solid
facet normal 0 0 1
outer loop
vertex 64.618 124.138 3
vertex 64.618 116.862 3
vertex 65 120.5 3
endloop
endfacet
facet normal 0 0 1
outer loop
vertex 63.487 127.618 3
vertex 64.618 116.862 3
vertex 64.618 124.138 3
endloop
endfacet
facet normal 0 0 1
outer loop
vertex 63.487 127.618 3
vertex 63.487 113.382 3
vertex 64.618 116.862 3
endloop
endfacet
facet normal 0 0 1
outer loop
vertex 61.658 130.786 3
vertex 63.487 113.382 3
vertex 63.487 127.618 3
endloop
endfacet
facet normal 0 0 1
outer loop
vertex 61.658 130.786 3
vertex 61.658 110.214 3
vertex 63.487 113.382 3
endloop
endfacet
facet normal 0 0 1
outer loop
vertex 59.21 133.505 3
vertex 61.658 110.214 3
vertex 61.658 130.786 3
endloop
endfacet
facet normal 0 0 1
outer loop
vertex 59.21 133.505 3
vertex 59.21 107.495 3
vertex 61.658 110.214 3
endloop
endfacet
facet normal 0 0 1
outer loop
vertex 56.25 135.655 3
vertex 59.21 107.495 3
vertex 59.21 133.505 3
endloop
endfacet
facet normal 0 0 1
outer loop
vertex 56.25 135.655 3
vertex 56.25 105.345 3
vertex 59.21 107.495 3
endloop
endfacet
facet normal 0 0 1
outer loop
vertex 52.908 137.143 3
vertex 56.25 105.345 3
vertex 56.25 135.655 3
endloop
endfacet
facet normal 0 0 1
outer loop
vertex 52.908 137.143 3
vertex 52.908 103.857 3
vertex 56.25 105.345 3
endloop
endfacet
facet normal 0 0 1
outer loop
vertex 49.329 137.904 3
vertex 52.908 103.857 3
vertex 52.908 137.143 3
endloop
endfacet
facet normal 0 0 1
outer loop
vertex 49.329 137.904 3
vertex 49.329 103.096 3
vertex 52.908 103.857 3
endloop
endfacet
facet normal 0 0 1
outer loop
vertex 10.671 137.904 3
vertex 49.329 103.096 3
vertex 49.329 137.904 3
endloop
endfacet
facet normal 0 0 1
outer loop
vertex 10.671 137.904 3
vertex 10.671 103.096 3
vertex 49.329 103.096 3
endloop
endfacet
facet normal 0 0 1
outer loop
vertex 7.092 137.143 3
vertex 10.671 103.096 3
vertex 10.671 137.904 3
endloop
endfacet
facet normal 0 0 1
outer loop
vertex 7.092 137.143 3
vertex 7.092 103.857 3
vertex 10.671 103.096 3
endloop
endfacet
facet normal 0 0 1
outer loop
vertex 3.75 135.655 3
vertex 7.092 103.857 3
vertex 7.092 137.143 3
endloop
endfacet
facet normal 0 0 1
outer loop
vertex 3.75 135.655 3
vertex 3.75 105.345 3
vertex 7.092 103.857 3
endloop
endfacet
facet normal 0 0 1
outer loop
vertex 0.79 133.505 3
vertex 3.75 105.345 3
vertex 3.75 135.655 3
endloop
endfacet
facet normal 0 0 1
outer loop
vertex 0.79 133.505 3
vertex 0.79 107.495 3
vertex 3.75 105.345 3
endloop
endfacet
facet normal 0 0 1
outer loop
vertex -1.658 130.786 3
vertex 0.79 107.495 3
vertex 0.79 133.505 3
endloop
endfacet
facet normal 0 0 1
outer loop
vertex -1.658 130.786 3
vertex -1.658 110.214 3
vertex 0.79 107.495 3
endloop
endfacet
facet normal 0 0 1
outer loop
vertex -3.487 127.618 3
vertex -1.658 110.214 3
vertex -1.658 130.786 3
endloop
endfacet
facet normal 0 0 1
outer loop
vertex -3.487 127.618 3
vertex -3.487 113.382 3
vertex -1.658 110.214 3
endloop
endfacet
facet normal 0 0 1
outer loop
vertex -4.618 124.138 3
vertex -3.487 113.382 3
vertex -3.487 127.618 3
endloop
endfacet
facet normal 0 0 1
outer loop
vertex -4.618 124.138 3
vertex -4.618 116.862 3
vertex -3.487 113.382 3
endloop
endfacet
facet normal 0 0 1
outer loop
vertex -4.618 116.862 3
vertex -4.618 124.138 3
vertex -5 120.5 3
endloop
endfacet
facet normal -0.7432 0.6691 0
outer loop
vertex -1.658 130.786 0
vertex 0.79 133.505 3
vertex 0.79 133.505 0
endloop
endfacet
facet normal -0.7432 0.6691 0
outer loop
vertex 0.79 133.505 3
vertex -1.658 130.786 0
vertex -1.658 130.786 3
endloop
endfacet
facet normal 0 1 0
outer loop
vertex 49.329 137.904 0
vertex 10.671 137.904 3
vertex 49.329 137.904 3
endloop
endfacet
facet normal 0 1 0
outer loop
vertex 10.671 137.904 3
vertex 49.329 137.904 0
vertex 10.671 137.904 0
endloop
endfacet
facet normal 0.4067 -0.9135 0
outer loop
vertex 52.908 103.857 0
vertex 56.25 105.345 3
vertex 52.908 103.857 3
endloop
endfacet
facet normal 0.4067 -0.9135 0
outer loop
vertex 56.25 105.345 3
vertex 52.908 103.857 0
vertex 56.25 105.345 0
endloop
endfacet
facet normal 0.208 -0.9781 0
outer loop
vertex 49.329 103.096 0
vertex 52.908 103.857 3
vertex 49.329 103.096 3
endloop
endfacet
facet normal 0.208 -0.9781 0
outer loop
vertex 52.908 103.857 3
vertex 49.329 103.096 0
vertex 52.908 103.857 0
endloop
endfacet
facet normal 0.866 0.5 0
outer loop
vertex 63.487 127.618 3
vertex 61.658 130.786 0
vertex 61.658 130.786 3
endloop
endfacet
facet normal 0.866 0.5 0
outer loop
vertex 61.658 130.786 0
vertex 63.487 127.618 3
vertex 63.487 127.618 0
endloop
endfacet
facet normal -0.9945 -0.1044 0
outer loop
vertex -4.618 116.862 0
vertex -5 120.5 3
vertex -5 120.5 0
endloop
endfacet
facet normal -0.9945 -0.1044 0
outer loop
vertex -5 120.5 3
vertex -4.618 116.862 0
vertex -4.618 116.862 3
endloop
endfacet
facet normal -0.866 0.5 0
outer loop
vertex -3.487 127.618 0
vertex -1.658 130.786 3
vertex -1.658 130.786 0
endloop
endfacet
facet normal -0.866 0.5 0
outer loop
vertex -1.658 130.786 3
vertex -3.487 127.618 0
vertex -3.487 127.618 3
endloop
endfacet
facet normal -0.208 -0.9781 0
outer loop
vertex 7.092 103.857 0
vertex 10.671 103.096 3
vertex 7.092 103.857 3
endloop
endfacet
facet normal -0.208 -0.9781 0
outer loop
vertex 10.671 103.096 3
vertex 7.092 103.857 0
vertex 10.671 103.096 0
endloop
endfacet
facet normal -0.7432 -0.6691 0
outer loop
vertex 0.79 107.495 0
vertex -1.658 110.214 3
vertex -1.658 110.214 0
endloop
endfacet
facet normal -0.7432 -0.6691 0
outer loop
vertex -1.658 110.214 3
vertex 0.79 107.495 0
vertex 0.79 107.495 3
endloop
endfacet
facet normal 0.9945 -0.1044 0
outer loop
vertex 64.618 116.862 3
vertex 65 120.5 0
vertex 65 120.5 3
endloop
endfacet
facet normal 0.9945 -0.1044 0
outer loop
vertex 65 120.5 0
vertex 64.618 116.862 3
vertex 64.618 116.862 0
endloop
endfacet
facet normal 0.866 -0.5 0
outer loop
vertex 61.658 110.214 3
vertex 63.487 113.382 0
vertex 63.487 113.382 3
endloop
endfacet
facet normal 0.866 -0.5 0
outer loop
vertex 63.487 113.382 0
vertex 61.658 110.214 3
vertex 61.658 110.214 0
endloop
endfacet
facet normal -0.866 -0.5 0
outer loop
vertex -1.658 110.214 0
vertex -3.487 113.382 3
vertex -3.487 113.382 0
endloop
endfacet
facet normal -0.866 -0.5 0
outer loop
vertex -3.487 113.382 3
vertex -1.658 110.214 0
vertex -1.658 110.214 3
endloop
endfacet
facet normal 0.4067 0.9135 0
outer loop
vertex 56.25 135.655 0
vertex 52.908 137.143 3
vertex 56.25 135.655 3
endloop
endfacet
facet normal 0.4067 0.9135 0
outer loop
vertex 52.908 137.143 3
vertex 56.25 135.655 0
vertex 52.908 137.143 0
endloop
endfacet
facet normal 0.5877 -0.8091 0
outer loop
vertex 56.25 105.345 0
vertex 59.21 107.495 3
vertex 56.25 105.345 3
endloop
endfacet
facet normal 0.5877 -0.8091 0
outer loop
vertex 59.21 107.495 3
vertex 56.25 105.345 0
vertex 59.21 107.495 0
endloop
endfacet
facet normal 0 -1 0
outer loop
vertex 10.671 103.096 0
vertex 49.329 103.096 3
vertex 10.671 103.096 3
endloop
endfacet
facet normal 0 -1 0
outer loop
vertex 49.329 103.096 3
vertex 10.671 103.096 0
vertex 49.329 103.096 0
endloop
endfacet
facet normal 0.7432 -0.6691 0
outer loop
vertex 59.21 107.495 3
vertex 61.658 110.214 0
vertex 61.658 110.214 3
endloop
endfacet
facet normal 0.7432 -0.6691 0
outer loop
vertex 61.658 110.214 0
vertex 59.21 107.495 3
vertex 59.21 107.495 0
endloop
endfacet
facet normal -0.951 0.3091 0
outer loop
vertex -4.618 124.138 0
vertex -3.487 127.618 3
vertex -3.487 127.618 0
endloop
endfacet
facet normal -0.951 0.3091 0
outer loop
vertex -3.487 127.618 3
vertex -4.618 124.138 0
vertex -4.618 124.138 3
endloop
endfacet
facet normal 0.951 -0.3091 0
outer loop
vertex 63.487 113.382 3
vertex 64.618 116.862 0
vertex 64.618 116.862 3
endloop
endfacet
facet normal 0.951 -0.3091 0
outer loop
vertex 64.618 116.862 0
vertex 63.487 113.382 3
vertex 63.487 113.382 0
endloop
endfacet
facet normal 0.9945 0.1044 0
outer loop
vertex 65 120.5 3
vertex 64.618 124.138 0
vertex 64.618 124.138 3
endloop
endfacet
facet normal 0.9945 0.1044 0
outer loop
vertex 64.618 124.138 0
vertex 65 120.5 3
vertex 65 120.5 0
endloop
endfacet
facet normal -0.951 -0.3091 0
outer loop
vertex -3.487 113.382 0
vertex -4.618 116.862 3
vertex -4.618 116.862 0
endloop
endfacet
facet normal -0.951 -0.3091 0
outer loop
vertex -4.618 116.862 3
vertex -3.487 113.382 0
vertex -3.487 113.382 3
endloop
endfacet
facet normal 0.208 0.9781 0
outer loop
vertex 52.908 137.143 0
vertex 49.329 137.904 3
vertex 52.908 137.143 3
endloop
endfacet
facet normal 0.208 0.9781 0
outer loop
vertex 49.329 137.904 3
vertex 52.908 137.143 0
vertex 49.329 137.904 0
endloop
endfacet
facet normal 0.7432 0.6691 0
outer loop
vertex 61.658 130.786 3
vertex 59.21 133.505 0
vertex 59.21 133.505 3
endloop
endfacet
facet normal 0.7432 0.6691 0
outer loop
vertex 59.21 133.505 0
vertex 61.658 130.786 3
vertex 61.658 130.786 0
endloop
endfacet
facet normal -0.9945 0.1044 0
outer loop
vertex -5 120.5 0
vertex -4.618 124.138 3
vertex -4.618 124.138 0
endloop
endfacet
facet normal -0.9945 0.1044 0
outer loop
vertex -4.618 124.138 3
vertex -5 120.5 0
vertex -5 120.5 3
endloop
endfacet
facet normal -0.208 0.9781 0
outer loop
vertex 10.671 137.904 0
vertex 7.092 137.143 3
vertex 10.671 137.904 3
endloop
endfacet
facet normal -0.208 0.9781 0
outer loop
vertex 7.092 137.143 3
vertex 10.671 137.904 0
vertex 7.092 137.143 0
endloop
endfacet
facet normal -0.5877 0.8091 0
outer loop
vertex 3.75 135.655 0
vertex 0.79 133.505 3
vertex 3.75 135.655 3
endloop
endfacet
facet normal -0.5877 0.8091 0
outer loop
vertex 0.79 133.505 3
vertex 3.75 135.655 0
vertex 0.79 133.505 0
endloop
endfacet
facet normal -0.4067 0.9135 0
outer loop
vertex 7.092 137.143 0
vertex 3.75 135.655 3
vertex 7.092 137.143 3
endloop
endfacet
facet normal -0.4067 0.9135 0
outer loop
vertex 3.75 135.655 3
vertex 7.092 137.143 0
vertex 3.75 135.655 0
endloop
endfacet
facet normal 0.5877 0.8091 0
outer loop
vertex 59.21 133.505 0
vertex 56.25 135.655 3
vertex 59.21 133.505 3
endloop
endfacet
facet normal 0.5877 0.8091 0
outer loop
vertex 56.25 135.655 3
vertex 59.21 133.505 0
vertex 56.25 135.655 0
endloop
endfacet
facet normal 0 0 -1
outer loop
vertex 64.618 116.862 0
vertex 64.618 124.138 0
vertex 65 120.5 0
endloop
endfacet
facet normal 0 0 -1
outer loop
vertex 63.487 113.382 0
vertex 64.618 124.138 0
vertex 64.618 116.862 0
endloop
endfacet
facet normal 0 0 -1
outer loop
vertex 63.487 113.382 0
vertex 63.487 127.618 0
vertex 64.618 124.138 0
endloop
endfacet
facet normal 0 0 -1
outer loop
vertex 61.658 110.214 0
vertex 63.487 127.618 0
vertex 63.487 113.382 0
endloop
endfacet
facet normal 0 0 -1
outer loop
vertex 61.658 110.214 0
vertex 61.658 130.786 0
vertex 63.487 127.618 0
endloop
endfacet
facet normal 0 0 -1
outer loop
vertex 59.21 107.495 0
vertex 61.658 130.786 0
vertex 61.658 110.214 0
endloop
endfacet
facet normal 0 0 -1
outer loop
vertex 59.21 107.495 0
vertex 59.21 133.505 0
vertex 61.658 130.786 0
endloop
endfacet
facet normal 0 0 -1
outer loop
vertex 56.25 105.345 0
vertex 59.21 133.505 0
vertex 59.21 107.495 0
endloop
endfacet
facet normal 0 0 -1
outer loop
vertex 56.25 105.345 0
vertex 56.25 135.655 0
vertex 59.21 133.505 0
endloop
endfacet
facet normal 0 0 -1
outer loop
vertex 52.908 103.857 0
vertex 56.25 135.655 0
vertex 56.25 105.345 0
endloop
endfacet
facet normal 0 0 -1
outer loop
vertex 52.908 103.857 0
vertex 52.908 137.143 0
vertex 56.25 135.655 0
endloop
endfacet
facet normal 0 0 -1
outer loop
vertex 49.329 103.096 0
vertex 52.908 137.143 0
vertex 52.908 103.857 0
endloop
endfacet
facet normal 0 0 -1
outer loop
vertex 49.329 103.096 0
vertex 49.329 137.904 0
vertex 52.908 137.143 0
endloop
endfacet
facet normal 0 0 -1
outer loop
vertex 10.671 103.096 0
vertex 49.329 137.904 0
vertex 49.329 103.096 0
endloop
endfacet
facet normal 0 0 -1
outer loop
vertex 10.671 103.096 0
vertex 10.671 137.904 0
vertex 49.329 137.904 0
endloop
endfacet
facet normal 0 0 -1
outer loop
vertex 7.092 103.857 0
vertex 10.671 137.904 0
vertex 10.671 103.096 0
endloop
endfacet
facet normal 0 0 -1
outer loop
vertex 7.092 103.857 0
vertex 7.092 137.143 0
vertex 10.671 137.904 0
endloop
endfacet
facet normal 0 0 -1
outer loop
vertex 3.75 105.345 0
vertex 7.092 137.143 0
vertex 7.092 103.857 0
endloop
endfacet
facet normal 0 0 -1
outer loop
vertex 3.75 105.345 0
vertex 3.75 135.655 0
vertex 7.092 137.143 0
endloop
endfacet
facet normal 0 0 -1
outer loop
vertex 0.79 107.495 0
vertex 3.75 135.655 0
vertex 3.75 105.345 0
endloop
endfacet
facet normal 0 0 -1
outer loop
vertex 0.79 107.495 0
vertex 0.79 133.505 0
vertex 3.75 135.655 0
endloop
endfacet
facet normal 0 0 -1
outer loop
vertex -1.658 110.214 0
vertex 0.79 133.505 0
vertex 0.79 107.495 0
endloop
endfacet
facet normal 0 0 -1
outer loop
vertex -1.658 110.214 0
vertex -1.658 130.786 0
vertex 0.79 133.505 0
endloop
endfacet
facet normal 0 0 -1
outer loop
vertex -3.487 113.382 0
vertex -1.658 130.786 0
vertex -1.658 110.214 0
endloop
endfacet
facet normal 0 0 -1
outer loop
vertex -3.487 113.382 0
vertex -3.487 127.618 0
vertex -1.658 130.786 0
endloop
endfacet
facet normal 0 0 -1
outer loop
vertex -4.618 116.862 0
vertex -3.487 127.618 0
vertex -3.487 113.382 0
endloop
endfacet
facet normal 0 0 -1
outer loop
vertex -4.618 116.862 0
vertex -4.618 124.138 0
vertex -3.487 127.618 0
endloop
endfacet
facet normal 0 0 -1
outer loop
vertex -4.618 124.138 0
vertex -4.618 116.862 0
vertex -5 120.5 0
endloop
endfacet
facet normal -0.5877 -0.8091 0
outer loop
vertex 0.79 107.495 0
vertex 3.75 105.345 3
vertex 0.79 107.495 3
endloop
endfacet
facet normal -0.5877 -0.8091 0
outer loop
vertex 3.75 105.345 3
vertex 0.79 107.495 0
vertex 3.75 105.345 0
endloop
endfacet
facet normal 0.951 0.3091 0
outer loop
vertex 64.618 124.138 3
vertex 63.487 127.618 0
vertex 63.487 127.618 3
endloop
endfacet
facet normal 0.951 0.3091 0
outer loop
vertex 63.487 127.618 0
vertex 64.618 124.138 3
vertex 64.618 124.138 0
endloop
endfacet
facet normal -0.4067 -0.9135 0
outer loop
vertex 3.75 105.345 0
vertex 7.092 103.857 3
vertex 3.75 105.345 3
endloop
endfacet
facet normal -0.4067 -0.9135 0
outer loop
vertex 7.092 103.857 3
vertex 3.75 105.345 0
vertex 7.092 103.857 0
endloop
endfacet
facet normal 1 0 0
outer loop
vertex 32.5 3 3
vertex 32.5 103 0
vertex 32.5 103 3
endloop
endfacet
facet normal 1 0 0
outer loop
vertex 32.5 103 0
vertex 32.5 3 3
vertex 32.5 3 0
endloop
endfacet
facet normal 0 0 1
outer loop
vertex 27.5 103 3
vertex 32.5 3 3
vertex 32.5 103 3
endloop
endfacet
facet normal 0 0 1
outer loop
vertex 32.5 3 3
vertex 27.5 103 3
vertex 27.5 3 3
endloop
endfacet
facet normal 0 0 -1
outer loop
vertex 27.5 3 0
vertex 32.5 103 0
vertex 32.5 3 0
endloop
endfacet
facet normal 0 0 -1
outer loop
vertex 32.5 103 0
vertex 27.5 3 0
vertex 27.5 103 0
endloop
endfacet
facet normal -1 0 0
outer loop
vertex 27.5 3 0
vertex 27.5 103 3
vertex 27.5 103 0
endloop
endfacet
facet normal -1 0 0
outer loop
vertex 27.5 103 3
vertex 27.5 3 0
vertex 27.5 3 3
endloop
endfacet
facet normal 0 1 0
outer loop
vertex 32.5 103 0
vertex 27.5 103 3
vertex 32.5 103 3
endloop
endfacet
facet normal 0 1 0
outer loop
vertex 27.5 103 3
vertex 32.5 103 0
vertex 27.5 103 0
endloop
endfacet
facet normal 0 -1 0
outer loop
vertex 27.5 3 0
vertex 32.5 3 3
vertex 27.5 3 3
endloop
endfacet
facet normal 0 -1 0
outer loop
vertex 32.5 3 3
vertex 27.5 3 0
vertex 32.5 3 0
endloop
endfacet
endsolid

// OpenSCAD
//Customizeable Garden Signs

//Approximite Size For Each Letter
Size = 10;

//Text
Text = "LETTUCE";

//Letters In The Text
Letters = 7;

//Thickness
Thickness = 3;

//Center (Distance That The Base Will Go To The Left)
Centerx = -5;

//Center (Distance That The Base Will Go Up)
Centery = 3;

//Stake Width
Width = 5;

//Stake Length
Length = 100;


//Base(Green)
translate([0,Length,0]){
    difference(){
        translate([(Letters*Size)/4+Centerx,(Letters*Size)/4+Centery,0]){
            hull(){
                cylinder(Thickness,(Letters*Size)/4,(Letters*Size)/4);
                translate([(Letters*Size)/2,0,0]){
                    cylinder(Thickness,(Letters*Size)/4,(Letters*Size)/4);
                }
            }
        }
        //Letters(White)
        color("Gold"){
            translate([0,(Letters*Size)/4,0]){
                translate([0,0,Thickness]){
                    text(Text, Size, "Liberation Serif");
                }
            }
        }
    }
}

//Stake(Grey)
color("SlateGray"){
    translate([Centerx,Centery,0]){
        translate([(Letters*Size)/2-Width/2,0,0]){
            cube([Width,Length,Thickness]);
        }
    }
}
